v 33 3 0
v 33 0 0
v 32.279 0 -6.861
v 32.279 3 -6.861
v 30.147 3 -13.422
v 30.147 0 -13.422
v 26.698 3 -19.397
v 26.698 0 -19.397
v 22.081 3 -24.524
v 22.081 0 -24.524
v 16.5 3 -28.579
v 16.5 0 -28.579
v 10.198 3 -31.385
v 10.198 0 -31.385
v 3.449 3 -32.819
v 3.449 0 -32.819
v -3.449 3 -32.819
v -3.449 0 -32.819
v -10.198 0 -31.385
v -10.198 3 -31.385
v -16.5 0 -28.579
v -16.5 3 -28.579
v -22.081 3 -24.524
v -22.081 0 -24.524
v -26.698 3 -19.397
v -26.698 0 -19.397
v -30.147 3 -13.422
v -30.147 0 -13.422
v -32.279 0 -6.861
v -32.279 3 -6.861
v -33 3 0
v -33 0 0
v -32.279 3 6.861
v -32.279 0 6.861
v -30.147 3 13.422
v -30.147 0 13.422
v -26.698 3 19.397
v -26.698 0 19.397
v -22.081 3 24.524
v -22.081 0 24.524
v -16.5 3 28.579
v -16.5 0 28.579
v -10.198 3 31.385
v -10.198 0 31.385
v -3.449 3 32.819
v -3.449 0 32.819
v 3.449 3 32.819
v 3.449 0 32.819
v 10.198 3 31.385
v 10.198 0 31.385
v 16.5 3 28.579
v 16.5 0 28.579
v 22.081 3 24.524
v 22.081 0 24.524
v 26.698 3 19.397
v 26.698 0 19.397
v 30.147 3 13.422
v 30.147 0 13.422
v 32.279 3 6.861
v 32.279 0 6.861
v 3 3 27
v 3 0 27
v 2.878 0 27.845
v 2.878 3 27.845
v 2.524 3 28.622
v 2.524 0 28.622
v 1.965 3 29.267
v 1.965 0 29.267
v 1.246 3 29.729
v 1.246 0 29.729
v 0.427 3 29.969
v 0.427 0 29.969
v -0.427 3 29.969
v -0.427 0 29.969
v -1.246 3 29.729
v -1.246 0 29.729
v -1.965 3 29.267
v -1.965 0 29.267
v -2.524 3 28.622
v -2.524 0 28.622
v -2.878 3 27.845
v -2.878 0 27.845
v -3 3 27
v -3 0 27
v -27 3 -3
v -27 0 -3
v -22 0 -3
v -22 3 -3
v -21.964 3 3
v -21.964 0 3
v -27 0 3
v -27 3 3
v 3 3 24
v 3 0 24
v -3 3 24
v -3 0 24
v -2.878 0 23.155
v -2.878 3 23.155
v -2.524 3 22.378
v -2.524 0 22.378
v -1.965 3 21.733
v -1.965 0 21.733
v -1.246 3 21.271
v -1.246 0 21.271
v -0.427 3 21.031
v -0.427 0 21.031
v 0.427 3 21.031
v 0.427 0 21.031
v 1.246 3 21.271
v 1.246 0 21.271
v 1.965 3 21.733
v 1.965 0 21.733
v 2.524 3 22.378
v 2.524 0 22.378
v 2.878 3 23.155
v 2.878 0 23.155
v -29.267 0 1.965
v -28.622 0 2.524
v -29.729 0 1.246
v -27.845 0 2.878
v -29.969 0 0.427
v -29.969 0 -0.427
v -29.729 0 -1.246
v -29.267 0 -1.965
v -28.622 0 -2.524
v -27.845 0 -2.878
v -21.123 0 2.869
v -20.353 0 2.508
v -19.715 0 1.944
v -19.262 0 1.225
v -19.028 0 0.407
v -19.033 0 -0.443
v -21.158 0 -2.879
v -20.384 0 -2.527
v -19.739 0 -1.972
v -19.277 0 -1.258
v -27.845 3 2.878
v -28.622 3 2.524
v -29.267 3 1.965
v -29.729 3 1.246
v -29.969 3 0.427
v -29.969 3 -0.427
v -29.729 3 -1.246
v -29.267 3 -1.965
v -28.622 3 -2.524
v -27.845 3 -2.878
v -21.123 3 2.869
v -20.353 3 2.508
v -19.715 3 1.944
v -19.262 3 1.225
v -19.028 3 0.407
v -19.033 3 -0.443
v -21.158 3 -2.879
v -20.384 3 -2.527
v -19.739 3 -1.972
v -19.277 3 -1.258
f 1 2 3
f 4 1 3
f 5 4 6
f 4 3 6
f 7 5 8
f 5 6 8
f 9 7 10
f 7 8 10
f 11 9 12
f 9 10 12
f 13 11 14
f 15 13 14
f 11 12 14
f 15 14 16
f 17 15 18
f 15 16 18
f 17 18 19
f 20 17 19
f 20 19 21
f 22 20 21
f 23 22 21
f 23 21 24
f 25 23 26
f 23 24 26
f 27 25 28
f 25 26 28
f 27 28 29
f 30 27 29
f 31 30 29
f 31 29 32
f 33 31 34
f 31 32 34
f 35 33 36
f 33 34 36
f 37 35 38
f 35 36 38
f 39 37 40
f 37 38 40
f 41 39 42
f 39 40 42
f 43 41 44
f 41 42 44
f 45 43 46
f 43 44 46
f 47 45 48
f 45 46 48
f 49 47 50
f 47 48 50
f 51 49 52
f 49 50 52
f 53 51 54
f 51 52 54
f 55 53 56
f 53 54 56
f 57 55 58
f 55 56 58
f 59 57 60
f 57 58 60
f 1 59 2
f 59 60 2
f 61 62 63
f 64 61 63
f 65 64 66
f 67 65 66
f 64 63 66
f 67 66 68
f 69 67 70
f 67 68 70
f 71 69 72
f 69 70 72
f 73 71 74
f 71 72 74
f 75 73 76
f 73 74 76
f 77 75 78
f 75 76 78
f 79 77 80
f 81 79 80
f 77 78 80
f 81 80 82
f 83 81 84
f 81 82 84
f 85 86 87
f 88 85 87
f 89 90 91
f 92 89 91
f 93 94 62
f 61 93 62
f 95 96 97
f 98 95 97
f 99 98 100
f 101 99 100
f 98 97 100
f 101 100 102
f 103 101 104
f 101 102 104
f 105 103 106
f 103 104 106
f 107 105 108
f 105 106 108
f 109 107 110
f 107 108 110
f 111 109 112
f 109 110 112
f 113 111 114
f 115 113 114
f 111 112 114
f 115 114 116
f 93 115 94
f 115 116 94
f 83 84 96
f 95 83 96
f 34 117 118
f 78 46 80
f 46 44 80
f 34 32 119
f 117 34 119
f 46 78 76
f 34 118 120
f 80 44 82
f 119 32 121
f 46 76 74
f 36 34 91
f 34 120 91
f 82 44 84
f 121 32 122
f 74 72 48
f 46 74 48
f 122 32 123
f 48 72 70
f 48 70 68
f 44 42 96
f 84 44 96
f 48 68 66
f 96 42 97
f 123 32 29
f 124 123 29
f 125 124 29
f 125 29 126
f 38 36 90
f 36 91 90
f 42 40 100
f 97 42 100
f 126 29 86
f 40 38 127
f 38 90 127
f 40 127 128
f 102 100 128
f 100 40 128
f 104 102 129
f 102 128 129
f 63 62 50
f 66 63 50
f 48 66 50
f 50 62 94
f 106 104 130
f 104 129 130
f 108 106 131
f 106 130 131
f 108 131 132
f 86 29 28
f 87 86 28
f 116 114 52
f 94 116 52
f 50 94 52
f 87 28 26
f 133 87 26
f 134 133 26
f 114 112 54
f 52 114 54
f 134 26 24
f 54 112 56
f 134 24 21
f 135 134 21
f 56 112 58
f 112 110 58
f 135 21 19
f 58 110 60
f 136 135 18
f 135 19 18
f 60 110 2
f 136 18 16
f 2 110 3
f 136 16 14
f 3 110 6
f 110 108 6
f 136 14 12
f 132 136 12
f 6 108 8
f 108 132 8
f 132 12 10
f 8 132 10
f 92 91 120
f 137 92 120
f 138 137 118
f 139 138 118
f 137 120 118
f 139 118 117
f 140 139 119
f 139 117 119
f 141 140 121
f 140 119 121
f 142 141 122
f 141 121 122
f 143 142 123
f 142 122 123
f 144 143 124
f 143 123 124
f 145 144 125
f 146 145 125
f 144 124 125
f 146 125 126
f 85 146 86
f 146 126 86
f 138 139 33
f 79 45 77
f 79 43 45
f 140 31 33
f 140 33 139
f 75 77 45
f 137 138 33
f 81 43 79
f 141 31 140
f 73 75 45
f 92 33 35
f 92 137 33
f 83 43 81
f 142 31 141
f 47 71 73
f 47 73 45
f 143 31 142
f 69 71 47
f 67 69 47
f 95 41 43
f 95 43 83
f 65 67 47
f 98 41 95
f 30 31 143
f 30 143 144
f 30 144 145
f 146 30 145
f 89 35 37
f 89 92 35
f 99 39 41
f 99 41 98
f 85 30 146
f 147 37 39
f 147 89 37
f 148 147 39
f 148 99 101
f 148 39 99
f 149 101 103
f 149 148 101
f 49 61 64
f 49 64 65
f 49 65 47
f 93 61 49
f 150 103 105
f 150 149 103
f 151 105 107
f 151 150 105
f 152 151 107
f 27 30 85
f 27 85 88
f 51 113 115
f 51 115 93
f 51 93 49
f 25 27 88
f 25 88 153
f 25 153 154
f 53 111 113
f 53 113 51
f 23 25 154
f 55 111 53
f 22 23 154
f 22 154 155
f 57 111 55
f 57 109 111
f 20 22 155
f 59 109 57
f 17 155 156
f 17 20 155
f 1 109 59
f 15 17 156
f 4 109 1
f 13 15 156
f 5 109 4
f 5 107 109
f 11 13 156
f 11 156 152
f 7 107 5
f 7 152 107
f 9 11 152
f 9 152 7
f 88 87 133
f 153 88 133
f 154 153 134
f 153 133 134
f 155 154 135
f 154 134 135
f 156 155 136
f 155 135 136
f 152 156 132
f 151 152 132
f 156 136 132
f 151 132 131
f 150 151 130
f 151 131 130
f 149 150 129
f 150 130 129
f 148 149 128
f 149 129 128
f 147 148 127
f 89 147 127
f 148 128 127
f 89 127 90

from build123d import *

# Parameters (mm, degrees)
SKETCH1_R           = 33
BOSS_EXTRUDE1_DEPTH = 3


with BuildPart() as part:
    # Sketch1 → Boss-Extrude1 (new body)
    with BuildSketch(Plane(origin=(0, 0, 0), x_dir=(1, 0, 0), z_dir=(0, 1, 0))):
        Circle(SKETCH1_R)
        with BuildLine():
            Line((-27, 3), (-22, 3))
            ThreePointArc((-22, 3), (-19.000055351, 0.018223725), (-21.963553222, -2.999778597))
            Line((-21.963553222, -2.999778597), (-27, -3))
            ThreePointArc((-27, -3), (-30, 0), (-27, 3))
        make_face(mode=Mode.SUBTRACT)
        with BuildLine():
            Line((-3, -27), (-3, -24))
            ThreePointArc((-3, -24), (0, -21), (3, -24))
            Line((3, -24), (3, -27))
            ThreePointArc((3, -27), (0, -30), (-3, -27))
        make_face(mode=Mode.SUBTRACT)
    extrude(amount=BOSS_EXTRUDE1_DEPTH)


solid = part.part
